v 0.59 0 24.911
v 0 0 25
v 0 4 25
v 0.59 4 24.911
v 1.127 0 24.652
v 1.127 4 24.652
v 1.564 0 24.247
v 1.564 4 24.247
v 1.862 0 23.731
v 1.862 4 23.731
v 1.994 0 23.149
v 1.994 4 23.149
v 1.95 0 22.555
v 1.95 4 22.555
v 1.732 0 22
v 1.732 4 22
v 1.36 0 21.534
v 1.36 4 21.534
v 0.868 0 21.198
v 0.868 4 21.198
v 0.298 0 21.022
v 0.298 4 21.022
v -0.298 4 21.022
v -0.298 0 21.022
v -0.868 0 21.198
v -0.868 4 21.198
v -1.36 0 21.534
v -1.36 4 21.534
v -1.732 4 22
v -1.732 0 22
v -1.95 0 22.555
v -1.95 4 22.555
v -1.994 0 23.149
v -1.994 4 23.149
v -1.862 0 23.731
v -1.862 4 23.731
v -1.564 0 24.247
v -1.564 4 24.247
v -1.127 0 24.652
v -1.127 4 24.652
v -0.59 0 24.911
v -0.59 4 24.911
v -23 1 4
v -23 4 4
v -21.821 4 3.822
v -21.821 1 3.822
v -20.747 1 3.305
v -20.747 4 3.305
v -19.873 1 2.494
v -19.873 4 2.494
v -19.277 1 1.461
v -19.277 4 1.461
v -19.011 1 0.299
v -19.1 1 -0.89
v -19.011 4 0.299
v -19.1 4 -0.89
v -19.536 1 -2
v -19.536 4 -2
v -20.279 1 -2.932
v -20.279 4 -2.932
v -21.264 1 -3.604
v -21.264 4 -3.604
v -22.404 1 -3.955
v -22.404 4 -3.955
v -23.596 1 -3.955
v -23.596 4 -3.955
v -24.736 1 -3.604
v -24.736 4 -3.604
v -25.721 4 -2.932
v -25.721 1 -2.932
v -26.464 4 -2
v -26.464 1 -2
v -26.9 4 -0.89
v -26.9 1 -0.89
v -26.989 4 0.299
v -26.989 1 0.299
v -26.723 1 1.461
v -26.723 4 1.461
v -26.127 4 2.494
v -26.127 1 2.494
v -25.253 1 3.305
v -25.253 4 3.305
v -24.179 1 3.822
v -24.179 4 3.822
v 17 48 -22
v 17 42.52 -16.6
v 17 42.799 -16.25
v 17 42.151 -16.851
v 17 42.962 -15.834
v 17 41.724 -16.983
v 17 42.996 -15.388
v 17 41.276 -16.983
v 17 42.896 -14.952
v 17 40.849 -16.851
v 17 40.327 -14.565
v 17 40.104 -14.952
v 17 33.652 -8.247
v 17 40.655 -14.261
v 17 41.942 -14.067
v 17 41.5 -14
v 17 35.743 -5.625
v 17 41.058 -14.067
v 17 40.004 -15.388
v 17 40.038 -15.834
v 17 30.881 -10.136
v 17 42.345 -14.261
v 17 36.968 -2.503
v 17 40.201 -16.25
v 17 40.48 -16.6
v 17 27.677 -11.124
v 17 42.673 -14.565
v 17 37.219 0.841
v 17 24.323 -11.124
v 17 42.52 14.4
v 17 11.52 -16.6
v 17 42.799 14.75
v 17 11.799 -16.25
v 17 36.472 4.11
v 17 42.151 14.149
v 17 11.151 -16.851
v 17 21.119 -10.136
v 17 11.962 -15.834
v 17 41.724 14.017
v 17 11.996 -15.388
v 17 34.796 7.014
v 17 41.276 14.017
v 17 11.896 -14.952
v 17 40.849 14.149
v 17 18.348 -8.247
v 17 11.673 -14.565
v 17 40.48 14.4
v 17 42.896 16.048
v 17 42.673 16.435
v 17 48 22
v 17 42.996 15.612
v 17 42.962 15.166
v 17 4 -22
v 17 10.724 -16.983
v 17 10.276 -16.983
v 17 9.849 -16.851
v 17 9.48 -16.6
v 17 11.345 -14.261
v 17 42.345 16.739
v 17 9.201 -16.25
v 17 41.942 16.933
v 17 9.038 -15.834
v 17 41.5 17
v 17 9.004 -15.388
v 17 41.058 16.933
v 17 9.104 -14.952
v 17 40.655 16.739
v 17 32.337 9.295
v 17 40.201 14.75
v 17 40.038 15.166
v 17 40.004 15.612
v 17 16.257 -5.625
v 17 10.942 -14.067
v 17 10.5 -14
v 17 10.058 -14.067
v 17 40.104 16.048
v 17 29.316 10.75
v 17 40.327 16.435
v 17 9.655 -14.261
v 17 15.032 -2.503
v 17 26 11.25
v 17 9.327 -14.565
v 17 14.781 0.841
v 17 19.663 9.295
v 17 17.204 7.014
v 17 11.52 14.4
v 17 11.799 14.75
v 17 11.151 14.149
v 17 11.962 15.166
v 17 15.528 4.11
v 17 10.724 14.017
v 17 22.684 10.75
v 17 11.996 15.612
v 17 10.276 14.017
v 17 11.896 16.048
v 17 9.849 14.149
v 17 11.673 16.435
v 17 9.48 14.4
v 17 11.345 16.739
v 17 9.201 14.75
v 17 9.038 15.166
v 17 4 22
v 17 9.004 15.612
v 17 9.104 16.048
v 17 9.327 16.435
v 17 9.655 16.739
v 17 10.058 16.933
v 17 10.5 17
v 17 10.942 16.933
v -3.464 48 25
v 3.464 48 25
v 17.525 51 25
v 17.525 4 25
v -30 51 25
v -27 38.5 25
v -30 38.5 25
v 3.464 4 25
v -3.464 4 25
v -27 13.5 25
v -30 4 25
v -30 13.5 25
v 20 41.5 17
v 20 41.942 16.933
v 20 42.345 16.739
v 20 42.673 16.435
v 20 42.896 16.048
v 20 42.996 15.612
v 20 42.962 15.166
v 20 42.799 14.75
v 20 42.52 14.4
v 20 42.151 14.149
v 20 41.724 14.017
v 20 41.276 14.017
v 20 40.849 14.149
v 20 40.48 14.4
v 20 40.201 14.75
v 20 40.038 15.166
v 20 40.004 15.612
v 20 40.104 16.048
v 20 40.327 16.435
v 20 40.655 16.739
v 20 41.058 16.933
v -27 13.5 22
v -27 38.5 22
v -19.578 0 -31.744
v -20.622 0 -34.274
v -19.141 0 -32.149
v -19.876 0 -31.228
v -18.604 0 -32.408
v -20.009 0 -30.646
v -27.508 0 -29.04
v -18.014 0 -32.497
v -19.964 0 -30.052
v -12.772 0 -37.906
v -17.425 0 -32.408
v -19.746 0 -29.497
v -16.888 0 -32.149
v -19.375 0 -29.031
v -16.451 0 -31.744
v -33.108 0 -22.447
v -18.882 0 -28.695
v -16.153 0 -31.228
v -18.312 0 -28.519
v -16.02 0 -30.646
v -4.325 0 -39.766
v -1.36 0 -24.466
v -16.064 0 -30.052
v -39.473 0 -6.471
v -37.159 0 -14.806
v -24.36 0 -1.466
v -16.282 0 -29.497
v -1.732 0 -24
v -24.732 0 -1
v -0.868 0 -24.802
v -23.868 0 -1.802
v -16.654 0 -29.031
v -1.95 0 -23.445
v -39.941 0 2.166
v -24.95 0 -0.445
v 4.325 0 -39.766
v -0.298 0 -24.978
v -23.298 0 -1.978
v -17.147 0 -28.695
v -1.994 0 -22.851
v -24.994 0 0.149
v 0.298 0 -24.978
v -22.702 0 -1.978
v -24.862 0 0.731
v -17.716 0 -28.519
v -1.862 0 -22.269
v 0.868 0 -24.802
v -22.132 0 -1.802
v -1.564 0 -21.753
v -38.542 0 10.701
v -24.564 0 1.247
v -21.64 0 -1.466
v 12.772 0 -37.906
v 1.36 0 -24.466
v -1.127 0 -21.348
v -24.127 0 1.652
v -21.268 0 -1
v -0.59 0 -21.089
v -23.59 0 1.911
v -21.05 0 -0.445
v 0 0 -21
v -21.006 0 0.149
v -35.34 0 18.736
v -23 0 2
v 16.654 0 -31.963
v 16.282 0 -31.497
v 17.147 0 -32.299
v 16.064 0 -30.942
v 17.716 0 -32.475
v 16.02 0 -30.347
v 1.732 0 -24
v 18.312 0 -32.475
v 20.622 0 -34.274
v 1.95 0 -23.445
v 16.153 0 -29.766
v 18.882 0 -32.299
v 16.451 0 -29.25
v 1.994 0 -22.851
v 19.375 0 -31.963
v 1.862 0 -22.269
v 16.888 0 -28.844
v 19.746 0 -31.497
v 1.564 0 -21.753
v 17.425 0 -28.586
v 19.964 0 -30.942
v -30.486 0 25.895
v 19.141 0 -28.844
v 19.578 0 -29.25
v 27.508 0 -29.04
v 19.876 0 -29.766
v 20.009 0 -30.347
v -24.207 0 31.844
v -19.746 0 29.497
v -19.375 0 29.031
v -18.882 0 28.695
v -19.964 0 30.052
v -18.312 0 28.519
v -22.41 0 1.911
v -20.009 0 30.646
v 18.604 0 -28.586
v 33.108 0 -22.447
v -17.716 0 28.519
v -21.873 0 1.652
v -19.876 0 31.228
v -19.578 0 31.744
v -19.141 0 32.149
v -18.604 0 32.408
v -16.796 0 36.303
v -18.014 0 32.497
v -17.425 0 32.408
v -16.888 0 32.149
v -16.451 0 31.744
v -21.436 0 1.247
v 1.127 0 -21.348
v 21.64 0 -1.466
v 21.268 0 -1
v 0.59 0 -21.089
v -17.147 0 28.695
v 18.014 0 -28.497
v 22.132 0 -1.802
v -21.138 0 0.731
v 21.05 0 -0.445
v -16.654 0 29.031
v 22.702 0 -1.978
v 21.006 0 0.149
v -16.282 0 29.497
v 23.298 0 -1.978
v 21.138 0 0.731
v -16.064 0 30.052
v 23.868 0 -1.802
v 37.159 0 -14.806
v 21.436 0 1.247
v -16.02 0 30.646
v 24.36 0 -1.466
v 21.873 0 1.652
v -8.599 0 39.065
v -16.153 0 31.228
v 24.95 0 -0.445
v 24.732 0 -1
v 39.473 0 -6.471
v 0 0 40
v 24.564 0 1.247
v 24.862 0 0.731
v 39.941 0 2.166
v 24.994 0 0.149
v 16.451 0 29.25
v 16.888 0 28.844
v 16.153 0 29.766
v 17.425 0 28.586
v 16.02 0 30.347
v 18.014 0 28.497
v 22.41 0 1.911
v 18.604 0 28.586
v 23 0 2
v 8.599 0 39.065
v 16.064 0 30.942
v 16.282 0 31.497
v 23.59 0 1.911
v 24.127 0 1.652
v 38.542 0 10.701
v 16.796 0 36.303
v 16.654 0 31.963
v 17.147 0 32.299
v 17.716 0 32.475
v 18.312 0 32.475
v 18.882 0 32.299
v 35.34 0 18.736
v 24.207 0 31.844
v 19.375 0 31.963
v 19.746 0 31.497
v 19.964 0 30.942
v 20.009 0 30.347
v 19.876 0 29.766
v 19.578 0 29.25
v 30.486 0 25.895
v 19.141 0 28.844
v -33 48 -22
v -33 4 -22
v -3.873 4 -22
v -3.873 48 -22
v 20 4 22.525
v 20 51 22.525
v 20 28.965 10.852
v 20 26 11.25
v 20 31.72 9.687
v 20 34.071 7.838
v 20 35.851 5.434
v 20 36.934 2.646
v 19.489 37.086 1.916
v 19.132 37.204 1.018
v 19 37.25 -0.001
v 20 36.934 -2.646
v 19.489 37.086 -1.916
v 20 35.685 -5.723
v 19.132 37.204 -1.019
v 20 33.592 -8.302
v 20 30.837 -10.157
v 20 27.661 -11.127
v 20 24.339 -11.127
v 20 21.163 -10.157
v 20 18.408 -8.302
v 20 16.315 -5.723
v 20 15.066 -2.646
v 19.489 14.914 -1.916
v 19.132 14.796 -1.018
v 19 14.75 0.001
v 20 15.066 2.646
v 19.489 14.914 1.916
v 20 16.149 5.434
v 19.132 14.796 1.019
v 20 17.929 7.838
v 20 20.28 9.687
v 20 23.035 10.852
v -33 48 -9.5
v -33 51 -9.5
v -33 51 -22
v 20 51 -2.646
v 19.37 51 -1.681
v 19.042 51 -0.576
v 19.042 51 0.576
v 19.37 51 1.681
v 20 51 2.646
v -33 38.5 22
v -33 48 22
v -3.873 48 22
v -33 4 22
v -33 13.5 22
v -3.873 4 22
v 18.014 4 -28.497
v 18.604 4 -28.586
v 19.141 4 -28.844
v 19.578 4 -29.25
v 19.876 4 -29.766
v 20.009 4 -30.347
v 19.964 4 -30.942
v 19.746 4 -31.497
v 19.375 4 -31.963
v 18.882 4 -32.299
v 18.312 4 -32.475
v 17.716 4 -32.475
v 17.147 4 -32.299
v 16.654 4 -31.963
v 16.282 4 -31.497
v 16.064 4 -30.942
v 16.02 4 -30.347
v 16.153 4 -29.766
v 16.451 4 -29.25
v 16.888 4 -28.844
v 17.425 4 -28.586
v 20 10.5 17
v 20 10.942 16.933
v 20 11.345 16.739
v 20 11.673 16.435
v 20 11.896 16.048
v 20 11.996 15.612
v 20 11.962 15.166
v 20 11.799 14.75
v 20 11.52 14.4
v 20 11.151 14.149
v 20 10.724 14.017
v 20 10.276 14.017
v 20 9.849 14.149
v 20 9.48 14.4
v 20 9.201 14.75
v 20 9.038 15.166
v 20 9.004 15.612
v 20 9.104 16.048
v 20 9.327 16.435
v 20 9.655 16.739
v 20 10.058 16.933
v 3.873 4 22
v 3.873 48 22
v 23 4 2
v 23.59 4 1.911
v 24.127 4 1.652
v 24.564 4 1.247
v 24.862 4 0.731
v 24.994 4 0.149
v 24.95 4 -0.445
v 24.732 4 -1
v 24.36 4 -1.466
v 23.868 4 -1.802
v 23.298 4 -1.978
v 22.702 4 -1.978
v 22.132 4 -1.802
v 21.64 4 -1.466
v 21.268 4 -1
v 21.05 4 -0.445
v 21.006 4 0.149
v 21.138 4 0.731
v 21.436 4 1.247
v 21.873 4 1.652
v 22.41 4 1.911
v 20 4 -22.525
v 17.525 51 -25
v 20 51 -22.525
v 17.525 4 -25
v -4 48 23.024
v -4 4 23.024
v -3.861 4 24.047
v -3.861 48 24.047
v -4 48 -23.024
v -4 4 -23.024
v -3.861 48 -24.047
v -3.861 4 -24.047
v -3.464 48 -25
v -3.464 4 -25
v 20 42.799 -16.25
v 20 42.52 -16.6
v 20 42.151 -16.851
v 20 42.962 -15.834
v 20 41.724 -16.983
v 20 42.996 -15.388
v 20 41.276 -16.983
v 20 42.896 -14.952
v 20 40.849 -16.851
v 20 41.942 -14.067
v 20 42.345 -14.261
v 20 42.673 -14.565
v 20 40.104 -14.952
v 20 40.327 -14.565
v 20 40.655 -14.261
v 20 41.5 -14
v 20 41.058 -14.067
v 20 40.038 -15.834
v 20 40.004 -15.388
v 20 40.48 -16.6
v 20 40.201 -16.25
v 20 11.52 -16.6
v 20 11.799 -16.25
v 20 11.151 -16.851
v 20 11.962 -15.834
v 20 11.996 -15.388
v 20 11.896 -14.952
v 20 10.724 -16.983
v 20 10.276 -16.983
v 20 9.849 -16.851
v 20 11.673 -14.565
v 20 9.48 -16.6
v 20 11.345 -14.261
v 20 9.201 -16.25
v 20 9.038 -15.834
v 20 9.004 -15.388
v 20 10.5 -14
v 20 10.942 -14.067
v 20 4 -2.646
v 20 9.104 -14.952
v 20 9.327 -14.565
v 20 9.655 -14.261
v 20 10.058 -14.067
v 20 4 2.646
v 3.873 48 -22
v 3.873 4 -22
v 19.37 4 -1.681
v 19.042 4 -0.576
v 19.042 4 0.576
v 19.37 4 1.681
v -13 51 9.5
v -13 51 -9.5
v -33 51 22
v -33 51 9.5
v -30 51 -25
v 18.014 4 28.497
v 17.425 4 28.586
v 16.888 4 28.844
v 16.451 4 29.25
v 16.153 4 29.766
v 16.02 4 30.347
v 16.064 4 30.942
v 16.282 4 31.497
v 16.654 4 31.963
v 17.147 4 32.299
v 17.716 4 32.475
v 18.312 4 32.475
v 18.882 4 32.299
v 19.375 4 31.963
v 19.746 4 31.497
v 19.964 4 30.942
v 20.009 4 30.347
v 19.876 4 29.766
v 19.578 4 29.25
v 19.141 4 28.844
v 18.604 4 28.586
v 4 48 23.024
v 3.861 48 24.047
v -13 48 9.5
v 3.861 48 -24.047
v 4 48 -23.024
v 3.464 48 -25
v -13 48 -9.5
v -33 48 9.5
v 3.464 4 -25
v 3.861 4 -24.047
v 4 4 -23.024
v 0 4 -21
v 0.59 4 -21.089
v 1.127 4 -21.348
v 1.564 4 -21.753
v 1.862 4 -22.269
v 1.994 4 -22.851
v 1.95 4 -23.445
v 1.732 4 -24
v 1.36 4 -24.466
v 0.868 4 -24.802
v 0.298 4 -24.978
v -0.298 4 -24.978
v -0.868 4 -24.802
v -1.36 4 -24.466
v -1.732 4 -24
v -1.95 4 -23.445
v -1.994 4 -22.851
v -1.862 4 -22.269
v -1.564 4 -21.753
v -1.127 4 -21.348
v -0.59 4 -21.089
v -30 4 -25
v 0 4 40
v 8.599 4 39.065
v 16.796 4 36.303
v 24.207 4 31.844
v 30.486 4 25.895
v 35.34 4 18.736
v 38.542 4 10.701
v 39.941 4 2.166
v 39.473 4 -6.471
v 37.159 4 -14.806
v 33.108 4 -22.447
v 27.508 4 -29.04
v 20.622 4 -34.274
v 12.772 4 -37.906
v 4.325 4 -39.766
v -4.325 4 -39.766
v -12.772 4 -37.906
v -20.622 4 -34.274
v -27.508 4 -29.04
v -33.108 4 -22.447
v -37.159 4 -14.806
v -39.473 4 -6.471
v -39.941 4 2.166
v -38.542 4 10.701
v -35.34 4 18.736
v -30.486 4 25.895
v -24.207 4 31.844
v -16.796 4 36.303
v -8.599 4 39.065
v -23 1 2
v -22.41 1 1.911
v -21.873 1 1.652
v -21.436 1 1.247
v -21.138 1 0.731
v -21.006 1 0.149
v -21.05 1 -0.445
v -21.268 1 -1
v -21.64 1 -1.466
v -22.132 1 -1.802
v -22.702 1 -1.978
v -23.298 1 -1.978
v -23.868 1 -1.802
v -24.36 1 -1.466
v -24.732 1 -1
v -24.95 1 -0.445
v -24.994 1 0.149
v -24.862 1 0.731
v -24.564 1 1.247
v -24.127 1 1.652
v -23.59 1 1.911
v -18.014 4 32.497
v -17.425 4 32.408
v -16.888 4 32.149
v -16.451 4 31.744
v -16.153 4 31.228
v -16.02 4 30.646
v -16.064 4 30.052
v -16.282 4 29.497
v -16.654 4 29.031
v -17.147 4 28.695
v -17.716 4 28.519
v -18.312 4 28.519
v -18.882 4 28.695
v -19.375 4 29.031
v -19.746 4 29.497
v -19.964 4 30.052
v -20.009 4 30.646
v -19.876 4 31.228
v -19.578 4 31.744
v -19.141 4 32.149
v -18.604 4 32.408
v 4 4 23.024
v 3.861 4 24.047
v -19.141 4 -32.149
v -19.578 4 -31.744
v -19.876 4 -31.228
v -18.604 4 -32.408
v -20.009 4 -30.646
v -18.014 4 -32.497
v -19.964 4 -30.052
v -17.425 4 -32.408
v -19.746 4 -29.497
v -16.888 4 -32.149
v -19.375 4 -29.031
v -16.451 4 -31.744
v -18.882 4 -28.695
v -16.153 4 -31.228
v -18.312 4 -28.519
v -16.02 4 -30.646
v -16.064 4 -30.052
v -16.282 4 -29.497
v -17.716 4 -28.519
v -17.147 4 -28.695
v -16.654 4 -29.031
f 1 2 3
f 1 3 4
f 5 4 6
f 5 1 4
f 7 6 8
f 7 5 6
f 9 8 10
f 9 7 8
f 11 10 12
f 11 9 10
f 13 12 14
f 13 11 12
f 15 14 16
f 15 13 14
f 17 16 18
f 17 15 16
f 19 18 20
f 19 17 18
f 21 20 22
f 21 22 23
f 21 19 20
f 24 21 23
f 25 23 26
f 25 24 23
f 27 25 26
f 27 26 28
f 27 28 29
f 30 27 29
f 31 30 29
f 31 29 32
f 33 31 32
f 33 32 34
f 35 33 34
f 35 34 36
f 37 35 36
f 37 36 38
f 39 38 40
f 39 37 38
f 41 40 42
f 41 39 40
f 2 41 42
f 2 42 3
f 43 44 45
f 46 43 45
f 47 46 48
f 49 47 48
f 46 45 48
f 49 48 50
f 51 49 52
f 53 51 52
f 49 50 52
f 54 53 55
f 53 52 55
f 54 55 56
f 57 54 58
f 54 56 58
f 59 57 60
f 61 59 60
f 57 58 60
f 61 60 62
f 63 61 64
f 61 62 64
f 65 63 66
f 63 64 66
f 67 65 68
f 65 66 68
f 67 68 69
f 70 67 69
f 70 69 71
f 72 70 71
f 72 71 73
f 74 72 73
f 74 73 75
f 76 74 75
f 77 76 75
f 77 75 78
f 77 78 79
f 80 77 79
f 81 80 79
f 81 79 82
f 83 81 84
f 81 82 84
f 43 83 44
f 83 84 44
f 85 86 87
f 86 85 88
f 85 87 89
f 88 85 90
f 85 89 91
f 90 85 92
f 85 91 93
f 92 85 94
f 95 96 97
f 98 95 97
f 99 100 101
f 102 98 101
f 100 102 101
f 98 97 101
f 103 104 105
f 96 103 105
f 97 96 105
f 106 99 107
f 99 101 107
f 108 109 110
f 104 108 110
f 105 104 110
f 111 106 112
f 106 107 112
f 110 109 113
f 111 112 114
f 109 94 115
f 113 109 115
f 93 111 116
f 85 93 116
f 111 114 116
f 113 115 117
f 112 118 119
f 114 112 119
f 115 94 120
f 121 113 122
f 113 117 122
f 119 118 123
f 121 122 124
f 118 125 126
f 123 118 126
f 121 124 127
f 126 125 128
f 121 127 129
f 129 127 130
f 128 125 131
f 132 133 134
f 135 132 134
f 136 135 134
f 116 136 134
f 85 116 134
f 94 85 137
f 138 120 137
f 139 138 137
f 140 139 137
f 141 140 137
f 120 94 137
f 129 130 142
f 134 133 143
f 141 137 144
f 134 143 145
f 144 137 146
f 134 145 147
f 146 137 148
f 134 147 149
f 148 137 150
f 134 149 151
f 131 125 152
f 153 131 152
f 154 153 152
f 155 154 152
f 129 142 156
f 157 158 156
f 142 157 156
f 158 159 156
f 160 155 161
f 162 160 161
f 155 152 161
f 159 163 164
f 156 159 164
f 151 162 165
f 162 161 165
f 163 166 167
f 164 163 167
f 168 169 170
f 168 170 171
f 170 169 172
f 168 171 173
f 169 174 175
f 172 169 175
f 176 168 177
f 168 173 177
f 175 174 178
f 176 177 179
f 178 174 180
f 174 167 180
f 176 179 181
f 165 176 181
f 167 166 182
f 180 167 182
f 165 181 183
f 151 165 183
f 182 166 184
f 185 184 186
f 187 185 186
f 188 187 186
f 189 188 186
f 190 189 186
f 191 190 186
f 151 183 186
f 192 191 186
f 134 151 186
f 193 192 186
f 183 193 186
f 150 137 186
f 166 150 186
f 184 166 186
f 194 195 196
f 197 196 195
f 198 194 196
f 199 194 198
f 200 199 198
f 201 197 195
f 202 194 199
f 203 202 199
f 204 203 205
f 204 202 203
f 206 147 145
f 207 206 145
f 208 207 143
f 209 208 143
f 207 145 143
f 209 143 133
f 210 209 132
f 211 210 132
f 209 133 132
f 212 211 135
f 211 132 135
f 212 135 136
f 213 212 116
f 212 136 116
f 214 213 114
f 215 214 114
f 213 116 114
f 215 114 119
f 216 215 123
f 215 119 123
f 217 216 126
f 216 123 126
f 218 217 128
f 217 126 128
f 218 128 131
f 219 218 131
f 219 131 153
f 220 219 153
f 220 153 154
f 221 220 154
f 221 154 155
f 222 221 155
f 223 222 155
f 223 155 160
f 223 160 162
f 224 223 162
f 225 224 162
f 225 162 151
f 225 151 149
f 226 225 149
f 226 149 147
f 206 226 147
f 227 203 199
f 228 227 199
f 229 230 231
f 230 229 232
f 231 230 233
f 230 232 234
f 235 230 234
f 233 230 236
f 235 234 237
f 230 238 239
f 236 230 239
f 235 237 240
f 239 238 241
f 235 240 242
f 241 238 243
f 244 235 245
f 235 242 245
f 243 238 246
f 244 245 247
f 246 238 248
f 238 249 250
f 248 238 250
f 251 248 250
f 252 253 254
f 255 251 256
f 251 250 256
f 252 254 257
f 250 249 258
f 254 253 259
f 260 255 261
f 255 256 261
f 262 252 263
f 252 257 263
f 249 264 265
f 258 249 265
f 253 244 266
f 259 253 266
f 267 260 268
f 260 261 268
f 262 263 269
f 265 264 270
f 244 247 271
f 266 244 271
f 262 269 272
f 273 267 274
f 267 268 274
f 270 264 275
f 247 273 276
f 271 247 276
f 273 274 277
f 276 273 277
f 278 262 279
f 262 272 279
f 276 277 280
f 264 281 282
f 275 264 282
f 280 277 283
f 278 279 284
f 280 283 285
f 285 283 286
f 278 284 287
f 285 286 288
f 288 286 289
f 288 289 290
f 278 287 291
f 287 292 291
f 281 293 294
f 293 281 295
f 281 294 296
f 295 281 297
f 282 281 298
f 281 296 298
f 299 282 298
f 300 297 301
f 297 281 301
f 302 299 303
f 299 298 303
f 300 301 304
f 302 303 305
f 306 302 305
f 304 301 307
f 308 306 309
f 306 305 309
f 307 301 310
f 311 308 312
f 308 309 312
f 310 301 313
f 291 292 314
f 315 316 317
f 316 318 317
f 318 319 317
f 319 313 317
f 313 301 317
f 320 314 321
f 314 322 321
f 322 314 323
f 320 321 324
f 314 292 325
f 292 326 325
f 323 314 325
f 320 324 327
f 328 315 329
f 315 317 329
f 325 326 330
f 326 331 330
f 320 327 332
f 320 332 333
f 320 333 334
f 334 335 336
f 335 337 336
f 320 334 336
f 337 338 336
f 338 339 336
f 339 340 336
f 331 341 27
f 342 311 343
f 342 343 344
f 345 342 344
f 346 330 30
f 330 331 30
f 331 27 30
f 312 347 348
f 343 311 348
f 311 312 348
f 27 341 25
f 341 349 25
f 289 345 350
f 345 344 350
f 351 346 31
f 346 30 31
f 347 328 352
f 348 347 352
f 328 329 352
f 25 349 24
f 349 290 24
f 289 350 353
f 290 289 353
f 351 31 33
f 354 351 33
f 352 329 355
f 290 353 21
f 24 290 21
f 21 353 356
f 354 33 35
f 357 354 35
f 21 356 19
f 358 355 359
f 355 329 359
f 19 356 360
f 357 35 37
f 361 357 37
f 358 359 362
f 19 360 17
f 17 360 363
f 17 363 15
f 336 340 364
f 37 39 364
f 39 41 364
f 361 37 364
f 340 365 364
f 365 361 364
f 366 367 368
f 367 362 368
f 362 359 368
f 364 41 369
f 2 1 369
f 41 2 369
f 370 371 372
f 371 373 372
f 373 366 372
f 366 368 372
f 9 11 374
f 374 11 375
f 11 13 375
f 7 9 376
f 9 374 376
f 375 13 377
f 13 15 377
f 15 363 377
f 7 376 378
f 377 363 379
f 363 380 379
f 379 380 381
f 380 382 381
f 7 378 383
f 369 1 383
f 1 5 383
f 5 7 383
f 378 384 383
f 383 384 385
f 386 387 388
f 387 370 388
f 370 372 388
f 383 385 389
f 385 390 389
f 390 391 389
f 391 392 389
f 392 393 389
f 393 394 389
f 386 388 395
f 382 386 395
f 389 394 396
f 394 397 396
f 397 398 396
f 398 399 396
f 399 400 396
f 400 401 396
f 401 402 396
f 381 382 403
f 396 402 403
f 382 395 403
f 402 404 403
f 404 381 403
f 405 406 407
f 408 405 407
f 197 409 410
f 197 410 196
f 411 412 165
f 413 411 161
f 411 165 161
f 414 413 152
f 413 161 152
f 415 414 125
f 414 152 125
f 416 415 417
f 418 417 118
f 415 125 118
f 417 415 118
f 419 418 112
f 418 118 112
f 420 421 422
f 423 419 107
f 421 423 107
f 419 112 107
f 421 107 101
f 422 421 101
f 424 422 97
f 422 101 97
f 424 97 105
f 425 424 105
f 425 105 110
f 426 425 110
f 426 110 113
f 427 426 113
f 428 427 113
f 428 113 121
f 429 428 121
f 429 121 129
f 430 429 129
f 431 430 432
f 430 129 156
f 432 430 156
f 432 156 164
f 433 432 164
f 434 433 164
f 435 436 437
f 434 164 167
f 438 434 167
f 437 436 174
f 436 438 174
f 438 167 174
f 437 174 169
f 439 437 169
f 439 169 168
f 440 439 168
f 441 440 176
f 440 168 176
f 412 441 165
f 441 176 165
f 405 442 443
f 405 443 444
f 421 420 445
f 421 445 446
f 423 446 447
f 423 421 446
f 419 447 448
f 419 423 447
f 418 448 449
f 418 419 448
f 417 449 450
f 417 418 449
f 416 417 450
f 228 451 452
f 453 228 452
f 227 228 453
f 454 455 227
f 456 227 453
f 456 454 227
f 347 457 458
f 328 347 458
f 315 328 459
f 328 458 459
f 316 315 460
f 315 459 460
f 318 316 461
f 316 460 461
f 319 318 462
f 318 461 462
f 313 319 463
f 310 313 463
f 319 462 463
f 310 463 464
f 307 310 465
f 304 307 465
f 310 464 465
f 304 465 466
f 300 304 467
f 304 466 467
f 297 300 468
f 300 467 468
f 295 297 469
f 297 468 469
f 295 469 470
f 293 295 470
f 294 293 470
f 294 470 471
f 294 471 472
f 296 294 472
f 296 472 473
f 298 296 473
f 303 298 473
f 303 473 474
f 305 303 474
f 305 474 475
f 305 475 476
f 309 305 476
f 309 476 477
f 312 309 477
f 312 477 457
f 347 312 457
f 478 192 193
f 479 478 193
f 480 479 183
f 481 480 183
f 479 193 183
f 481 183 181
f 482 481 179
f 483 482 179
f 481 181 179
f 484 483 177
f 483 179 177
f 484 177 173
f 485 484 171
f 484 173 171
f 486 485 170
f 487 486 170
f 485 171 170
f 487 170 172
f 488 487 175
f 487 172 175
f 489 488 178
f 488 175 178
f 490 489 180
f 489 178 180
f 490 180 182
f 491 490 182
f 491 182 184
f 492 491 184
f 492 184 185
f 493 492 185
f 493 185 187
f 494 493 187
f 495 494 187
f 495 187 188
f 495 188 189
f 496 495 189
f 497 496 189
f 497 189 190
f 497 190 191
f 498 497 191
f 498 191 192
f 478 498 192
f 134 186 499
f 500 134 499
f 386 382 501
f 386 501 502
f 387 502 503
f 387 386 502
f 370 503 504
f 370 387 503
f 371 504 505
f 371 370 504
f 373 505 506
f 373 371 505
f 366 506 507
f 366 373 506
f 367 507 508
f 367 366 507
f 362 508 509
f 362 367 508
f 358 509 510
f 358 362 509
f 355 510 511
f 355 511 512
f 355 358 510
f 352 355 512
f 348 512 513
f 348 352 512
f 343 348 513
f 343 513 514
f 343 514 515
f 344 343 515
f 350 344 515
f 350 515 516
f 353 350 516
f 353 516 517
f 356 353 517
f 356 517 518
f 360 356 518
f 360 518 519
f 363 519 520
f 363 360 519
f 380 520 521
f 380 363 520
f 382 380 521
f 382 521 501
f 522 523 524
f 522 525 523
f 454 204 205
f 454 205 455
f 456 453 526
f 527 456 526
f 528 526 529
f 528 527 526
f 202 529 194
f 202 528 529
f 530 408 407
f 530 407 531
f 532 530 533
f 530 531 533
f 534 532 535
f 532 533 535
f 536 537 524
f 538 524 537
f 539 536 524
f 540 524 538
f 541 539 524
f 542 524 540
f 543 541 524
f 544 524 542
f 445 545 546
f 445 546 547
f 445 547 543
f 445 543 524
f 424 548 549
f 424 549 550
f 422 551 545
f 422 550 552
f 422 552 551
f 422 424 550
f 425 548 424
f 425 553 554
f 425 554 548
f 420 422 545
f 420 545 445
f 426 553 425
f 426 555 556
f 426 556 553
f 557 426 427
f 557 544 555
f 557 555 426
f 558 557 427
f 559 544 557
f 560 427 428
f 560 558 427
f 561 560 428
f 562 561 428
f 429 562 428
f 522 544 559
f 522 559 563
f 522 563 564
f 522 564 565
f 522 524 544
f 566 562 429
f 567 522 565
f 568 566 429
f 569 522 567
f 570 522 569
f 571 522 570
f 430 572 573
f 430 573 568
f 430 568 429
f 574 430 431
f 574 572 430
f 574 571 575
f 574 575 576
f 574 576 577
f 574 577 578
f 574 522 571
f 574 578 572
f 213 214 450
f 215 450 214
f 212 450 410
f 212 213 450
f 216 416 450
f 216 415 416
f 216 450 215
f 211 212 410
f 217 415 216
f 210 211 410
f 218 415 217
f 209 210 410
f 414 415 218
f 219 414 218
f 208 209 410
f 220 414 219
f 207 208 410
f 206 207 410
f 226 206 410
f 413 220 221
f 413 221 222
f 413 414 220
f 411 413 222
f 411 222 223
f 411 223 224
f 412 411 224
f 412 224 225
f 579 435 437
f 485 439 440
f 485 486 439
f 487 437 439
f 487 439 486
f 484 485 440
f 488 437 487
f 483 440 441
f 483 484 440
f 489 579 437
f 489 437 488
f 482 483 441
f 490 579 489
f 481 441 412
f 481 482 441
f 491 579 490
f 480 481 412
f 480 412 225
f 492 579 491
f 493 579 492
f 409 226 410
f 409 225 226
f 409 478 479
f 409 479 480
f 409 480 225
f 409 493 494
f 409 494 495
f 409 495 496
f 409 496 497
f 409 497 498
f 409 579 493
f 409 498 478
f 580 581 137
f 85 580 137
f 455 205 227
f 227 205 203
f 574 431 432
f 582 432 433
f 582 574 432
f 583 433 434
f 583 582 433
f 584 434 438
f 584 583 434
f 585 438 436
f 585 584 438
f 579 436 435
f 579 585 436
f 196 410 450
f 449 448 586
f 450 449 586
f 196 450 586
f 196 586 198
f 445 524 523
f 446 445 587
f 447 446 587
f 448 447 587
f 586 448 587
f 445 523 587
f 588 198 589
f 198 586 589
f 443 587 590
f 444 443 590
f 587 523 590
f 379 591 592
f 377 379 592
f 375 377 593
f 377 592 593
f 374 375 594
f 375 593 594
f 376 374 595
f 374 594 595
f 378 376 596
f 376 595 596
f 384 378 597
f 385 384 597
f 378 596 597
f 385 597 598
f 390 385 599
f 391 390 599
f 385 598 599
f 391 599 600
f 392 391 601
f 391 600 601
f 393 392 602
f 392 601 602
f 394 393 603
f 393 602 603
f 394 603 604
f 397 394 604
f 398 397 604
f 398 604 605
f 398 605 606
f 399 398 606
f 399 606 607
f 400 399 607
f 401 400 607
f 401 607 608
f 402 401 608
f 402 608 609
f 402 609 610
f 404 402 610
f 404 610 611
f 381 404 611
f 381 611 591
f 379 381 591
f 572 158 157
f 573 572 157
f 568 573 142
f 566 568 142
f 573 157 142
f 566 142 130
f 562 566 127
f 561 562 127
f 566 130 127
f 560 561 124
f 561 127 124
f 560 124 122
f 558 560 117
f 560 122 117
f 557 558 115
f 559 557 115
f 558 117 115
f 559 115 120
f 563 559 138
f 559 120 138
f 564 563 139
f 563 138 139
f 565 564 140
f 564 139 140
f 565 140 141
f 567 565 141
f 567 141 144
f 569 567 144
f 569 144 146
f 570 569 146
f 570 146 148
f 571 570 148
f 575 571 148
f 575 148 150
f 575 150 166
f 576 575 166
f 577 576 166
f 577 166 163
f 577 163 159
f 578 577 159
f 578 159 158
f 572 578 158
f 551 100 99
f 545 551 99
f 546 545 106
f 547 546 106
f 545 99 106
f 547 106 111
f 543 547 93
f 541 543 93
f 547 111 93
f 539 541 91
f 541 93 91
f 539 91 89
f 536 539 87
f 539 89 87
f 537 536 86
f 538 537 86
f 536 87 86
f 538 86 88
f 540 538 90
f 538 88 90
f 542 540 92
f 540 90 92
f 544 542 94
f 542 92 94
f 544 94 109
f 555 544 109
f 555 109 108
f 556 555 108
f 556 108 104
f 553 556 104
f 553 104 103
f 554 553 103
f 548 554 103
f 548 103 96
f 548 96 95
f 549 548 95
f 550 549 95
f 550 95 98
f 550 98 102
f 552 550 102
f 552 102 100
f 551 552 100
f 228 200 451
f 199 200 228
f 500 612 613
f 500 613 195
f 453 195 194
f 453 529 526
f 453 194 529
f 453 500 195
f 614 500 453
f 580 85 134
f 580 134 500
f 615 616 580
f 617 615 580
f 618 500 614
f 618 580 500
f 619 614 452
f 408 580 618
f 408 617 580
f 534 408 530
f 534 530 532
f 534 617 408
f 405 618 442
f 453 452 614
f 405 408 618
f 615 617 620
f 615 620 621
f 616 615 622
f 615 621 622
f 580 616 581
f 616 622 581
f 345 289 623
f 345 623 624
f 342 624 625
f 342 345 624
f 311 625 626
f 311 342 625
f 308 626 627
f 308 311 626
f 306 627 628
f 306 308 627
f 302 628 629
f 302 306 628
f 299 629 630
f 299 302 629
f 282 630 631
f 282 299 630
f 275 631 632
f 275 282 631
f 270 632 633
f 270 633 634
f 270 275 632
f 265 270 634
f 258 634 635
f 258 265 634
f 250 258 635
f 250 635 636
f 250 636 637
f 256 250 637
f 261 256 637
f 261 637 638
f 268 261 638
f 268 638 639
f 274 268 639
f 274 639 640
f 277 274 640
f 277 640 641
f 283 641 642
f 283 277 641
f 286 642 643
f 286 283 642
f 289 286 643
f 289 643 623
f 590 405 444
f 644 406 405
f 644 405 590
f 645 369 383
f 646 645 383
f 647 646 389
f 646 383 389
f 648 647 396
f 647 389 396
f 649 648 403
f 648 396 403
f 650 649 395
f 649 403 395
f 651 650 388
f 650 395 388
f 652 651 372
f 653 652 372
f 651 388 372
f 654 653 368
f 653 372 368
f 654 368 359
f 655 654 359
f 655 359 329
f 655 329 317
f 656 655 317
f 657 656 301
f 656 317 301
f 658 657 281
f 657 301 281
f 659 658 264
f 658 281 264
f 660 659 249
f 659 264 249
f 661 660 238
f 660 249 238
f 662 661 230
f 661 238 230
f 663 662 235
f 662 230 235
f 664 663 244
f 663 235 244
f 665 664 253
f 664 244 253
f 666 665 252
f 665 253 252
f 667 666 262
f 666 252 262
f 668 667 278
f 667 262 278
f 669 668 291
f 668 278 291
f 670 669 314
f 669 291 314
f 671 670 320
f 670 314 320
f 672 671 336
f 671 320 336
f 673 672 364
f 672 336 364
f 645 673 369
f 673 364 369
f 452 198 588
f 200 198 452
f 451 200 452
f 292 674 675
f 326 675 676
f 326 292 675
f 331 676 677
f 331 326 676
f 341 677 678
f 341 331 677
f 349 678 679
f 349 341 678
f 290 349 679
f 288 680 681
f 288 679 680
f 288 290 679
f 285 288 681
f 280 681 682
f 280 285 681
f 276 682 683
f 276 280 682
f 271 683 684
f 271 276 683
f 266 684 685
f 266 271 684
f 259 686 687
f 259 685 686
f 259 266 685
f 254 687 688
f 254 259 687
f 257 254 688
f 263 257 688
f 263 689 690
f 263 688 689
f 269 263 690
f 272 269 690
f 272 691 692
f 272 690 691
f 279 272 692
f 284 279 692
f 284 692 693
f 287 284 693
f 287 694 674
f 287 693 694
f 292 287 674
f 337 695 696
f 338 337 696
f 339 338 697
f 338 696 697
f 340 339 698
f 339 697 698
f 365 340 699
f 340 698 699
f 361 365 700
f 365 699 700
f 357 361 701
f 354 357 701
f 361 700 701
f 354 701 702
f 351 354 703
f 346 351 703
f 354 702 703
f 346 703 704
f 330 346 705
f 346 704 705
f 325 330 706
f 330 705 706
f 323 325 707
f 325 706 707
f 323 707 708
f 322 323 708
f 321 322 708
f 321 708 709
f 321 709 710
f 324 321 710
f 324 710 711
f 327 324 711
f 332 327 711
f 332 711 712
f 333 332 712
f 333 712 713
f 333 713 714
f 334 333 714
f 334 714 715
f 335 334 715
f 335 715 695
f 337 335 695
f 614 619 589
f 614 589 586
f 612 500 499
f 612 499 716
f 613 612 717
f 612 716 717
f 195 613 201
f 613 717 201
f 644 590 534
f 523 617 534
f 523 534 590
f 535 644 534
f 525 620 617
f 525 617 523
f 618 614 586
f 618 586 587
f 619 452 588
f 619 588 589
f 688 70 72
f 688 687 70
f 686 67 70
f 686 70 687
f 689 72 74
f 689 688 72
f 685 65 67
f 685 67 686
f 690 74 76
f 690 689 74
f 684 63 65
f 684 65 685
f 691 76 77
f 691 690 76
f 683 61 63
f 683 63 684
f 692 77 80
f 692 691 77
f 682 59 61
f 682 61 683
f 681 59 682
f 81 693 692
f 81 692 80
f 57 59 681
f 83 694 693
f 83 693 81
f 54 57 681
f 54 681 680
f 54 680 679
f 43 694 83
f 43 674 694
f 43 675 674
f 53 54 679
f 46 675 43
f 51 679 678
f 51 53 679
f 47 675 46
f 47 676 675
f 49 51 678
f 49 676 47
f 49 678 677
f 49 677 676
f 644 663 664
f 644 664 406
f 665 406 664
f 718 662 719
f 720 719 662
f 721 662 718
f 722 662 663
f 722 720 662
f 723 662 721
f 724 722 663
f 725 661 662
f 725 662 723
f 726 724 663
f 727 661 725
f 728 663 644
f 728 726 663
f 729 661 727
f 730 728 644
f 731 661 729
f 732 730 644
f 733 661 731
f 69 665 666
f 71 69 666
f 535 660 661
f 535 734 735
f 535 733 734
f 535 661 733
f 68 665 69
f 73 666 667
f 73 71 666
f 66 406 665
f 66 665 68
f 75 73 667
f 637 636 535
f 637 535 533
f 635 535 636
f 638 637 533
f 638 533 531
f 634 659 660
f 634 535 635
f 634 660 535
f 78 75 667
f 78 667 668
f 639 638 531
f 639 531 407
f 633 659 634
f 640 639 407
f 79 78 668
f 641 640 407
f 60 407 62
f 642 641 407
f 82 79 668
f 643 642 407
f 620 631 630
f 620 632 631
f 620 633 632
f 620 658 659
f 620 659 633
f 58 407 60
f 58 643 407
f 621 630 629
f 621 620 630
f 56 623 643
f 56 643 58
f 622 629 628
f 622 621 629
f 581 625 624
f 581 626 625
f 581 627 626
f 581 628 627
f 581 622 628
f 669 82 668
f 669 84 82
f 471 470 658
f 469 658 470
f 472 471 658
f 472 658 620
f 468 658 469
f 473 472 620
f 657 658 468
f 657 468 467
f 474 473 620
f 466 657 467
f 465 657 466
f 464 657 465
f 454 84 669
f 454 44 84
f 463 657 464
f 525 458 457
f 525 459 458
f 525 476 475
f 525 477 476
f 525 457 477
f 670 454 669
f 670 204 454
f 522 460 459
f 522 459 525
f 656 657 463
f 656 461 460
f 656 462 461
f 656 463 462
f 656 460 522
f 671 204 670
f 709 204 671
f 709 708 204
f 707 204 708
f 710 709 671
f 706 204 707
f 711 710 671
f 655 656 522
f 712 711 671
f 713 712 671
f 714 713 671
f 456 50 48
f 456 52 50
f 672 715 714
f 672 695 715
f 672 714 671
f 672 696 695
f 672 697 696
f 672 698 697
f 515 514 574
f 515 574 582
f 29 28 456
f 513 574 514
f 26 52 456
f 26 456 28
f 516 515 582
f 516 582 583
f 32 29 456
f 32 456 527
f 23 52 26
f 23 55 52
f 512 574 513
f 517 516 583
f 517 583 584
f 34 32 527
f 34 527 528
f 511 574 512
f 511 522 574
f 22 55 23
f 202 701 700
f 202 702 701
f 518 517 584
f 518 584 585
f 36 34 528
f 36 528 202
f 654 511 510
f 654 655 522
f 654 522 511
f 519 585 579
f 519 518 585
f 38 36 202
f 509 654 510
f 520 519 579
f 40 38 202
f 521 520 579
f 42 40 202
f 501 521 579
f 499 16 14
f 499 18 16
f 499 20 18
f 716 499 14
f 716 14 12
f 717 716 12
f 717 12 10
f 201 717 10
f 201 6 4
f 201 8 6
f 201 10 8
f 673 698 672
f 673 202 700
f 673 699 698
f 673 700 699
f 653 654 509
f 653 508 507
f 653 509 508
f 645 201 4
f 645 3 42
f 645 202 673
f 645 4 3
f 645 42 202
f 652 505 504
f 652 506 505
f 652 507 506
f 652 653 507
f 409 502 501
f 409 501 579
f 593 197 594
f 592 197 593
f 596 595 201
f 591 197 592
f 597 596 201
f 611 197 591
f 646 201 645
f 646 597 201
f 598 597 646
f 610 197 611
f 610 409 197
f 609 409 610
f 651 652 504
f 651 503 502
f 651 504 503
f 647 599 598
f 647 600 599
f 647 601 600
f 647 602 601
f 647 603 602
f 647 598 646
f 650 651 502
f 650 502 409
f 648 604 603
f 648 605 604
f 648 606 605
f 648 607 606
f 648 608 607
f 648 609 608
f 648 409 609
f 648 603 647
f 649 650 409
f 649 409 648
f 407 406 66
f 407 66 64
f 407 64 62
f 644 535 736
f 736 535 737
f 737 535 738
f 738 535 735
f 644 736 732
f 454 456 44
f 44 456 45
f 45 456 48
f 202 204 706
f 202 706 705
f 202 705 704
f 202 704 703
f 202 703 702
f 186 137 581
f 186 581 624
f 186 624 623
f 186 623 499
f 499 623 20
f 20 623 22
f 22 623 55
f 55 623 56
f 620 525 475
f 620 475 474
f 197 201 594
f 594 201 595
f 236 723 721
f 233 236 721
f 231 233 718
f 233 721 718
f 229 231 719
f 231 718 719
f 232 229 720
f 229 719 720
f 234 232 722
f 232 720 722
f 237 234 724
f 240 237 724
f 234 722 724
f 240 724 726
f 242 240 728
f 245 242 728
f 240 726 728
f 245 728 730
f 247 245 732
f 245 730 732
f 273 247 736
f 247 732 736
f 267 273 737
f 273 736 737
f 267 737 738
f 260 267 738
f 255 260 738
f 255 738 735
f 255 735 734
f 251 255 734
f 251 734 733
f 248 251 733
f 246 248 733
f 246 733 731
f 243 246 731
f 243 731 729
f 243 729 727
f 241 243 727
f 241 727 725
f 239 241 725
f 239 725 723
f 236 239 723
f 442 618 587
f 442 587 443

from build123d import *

# Parameters (mm, degrees)
SKETCH_1_R          = 40
SKETCH_1_R_2        = 2
EXTRUDE_1_DEPTH     = 4
EXTRUDE_2_DEPTH     = 44
EXTRUDE_4_DEPTH     = 3
SKETCH_5_R          = 1.5
SKETCH_5_R_2        = 11.25
CUT_EXTRUDE_1_DEPTH = 87.313382508
SKETCH_6_W          = 6
SKETCH_6_H          = 25
CUT_EXTRUDE_2_DEPTH = 3
SKETCH_8_R          = 2
CUT_EXTRUDE_3_DEPTH = 74.545904097
SKETCH_9_R          = 4
CUT_EXTRUDE_4_DEPTH = 3


with BuildPart() as part:
    # 草图1 → 凸台-拉伸1 (new body)
    with BuildSketch(Plane(origin=(0, 0, 0), x_dir=(1, 0, 0), z_dir=(0, 1, 0))):
        with Locations(Location((0, 0, 0), (0, 0, 270))):
            Circle(SKETCH_1_R)
        with Locations(Location((0, 23, 0), (0, 0, 270))):
            Circle(SKETCH_1_R_2, mode=Mode.SUBTRACT)
        with Locations(Location((23, 0, 0), (0, 0, 270))):
            Circle(SKETCH_1_R_2, mode=Mode.SUBTRACT)
        with Locations(Location((0, -23, 0), (0, 0, 270))):
            Circle(SKETCH_1_R_2, mode=Mode.SUBTRACT)
        with Locations(Location((-23, 0, 0), (0, 0, 270))):
            Circle(SKETCH_1_R_2, mode=Mode.SUBTRACT)
    extrude(amount=EXTRUDE_1_DEPTH)

    # 草图2 → 凸台-拉伸2 (add)
    with BuildSketch(Plane(origin=(0, 4, 0), x_dir=(1, 0, 0), z_dir=(0, 1, 0))):
        with BuildLine():
            Line((-33, 22), (-3.872983346, 22))
            ThreePointArc((-3.872983346, 22), (-3.963357659, 23.540181513), (-3.464101615, 25))
            Line((-3.464101615, 25), (-30, 25))
            Line((-30, 25), (-33, 22))
        make_face()
        with BuildLine():
            Line((-33, -22), (-3.872983346, -22))
            ThreePointArc((-3.872983346, -22), (-3.963357659, -23.540181513), (-3.464101615, -25))
            Line((-3.464101615, -25), (-30, -25))
            Line((-30, -25), (-33, -22))
        make_face()
        with BuildLine():
            Line((17, 22), (17, -22))
            Line((17, -22), (3.872983346, -22))
            ThreePointArc((3.872983346, -22), (3.963357659, -23.540181513), (3.464101615, -25))
            Line((3.464101615, -25), (17.525126266, -25))
            Line((17.525126266, -25), (20, -22.525126266))
            Line((20, -22.525126266), (20, -2.645751311))
            ThreePointArc((20, -2.645751311), (19, 0), (20, 2.645751311))
            Line((20, 2.645751311), (20, 22.525126266))
            Line((20, 22.525126266), (17.525126266, 25))
            Line((17.525126266, 25), (3.464101615, 25))
            ThreePointArc((3.464101615, 25), (3.963357659, 23.540181513), (3.872983346, 22))
            Line((3.872983346, 22), (17, 22))
        make_face()
    extrude(amount=EXTRUDE_2_DEPTH)

    # 草图3 → 凸台-拉伸4 (add)
    with BuildSketch(Plane(origin=(0, 48, 0), x_dir=(1, 0, 0), z_dir=(0, 1, 0))):
        with BuildLine():
            Line((-3.464101615, 25), (3.464101615, 25))
            Line((3.464101615, 25), (17.525126266, 25))
            Line((17.525126266, 25), (20, 22.525126266))
            Line((20, 22.525126266), (20, 2.645751311))
            ThreePointArc((20, 2.645751311), (19, 0), (20, -2.645751311))
            Line((20, -2.645751311), (20, -22.525126266))
            Line((20, -22.525126266), (17.525126266, -25))
            Line((17.525126266, -25), (3.464101615, -25))
            Line((3.464101615, -25), (-3.464101615, -25))
            Line((-3.464101615, -25), (-30, -25))
            Line((-30, -25), (-33, -22))
            Line((-33, -22), (-33, -9.5))
            Line((-33, -9.5), (-23, -9.5))
            Line((-23, -9.5), (-13, -9.5))
            Line((-13, -9.5), (-13, -7.5))
            Line((-13, -7.5), (-13, 7.5))
            Line((-13, 7.5), (-13, 9.5))
            Line((-13, 9.5), (-23, 9.5))
            Line((-23, 9.5), (-33, 9.5))
            Line((-33, 9.5), (-33, 22))
            Line((-33, 22), (-30, 25))
            Line((-30, 25), (-3.464101615, 25))
        make_face()
    extrude(amount=EXTRUDE_4_DEPTH)

    # 草图5 → 切除-拉伸1 (cut, through all)
    with BuildSketch(Plane.ZY.offset(-17)):
        with Locations((15.5, 41.5)):
            Circle(SKETCH_5_R)
        with Locations((-15.5, 41.5)):
            Circle(SKETCH_5_R)
        with Locations((-15.5, 10.5)):
            Circle(SKETCH_5_R)
        with Locations((15.5, 10.5)):
            Circle(SKETCH_5_R)
        with Locations((0, 26)):
            Circle(SKETCH_5_R_2)
    extrude(amount=-CUT_EXTRUDE_1_DEPTH, mode=Mode.SUBTRACT)

    # 草图6 → 切除-拉伸2 (cut)
    with BuildSketch(Plane.XY.offset(25)):
        with Locations((-30, 26)):
            Rectangle(SKETCH_6_W, SKETCH_6_H)
    extrude(amount=-CUT_EXTRUDE_2_DEPTH, mode=Mode.SUBTRACT)

    # 草图8 → 切除-拉伸3 (cut, through all)
    with BuildSketch(Plane(origin=(0, 4, 0), x_dir=(1, 0, 0), z_dir=(0, 1, 0))):
        with Locations(Location((18.014281267, 30.496919032, 0), (0, 0, 270))):
            Circle(SKETCH_8_R)
        with Locations(Location((18.014281267, -30.496919032, 0), (0, 0, 90))):
            Circle(SKETCH_8_R)
        with Locations(Location((-18.014281267, -30.496919032, 0), (0, 0, 270))):
            Circle(SKETCH_8_R)
        with Locations(Location((-18.014281267, 30.496919032, 0), (0, 0, 90))):
            Circle(SKETCH_8_R)
    extrude(amount=-CUT_EXTRUDE_3_DEPTH, mode=Mode.SUBTRACT)

    # 草图9 → 切除-拉伸4 (cut)
    with BuildSketch(Plane(origin=(0, 4, 0), x_dir=(1, 0, 0), z_dir=(0, 1, 0))):
        with Locations(Location((-23, 0, 0), (0, 0, 270))):
            Circle(SKETCH_9_R)
    extrude(amount=-CUT_EXTRUDE_4_DEPTH, mode=Mode.SUBTRACT)


solid = part.part
